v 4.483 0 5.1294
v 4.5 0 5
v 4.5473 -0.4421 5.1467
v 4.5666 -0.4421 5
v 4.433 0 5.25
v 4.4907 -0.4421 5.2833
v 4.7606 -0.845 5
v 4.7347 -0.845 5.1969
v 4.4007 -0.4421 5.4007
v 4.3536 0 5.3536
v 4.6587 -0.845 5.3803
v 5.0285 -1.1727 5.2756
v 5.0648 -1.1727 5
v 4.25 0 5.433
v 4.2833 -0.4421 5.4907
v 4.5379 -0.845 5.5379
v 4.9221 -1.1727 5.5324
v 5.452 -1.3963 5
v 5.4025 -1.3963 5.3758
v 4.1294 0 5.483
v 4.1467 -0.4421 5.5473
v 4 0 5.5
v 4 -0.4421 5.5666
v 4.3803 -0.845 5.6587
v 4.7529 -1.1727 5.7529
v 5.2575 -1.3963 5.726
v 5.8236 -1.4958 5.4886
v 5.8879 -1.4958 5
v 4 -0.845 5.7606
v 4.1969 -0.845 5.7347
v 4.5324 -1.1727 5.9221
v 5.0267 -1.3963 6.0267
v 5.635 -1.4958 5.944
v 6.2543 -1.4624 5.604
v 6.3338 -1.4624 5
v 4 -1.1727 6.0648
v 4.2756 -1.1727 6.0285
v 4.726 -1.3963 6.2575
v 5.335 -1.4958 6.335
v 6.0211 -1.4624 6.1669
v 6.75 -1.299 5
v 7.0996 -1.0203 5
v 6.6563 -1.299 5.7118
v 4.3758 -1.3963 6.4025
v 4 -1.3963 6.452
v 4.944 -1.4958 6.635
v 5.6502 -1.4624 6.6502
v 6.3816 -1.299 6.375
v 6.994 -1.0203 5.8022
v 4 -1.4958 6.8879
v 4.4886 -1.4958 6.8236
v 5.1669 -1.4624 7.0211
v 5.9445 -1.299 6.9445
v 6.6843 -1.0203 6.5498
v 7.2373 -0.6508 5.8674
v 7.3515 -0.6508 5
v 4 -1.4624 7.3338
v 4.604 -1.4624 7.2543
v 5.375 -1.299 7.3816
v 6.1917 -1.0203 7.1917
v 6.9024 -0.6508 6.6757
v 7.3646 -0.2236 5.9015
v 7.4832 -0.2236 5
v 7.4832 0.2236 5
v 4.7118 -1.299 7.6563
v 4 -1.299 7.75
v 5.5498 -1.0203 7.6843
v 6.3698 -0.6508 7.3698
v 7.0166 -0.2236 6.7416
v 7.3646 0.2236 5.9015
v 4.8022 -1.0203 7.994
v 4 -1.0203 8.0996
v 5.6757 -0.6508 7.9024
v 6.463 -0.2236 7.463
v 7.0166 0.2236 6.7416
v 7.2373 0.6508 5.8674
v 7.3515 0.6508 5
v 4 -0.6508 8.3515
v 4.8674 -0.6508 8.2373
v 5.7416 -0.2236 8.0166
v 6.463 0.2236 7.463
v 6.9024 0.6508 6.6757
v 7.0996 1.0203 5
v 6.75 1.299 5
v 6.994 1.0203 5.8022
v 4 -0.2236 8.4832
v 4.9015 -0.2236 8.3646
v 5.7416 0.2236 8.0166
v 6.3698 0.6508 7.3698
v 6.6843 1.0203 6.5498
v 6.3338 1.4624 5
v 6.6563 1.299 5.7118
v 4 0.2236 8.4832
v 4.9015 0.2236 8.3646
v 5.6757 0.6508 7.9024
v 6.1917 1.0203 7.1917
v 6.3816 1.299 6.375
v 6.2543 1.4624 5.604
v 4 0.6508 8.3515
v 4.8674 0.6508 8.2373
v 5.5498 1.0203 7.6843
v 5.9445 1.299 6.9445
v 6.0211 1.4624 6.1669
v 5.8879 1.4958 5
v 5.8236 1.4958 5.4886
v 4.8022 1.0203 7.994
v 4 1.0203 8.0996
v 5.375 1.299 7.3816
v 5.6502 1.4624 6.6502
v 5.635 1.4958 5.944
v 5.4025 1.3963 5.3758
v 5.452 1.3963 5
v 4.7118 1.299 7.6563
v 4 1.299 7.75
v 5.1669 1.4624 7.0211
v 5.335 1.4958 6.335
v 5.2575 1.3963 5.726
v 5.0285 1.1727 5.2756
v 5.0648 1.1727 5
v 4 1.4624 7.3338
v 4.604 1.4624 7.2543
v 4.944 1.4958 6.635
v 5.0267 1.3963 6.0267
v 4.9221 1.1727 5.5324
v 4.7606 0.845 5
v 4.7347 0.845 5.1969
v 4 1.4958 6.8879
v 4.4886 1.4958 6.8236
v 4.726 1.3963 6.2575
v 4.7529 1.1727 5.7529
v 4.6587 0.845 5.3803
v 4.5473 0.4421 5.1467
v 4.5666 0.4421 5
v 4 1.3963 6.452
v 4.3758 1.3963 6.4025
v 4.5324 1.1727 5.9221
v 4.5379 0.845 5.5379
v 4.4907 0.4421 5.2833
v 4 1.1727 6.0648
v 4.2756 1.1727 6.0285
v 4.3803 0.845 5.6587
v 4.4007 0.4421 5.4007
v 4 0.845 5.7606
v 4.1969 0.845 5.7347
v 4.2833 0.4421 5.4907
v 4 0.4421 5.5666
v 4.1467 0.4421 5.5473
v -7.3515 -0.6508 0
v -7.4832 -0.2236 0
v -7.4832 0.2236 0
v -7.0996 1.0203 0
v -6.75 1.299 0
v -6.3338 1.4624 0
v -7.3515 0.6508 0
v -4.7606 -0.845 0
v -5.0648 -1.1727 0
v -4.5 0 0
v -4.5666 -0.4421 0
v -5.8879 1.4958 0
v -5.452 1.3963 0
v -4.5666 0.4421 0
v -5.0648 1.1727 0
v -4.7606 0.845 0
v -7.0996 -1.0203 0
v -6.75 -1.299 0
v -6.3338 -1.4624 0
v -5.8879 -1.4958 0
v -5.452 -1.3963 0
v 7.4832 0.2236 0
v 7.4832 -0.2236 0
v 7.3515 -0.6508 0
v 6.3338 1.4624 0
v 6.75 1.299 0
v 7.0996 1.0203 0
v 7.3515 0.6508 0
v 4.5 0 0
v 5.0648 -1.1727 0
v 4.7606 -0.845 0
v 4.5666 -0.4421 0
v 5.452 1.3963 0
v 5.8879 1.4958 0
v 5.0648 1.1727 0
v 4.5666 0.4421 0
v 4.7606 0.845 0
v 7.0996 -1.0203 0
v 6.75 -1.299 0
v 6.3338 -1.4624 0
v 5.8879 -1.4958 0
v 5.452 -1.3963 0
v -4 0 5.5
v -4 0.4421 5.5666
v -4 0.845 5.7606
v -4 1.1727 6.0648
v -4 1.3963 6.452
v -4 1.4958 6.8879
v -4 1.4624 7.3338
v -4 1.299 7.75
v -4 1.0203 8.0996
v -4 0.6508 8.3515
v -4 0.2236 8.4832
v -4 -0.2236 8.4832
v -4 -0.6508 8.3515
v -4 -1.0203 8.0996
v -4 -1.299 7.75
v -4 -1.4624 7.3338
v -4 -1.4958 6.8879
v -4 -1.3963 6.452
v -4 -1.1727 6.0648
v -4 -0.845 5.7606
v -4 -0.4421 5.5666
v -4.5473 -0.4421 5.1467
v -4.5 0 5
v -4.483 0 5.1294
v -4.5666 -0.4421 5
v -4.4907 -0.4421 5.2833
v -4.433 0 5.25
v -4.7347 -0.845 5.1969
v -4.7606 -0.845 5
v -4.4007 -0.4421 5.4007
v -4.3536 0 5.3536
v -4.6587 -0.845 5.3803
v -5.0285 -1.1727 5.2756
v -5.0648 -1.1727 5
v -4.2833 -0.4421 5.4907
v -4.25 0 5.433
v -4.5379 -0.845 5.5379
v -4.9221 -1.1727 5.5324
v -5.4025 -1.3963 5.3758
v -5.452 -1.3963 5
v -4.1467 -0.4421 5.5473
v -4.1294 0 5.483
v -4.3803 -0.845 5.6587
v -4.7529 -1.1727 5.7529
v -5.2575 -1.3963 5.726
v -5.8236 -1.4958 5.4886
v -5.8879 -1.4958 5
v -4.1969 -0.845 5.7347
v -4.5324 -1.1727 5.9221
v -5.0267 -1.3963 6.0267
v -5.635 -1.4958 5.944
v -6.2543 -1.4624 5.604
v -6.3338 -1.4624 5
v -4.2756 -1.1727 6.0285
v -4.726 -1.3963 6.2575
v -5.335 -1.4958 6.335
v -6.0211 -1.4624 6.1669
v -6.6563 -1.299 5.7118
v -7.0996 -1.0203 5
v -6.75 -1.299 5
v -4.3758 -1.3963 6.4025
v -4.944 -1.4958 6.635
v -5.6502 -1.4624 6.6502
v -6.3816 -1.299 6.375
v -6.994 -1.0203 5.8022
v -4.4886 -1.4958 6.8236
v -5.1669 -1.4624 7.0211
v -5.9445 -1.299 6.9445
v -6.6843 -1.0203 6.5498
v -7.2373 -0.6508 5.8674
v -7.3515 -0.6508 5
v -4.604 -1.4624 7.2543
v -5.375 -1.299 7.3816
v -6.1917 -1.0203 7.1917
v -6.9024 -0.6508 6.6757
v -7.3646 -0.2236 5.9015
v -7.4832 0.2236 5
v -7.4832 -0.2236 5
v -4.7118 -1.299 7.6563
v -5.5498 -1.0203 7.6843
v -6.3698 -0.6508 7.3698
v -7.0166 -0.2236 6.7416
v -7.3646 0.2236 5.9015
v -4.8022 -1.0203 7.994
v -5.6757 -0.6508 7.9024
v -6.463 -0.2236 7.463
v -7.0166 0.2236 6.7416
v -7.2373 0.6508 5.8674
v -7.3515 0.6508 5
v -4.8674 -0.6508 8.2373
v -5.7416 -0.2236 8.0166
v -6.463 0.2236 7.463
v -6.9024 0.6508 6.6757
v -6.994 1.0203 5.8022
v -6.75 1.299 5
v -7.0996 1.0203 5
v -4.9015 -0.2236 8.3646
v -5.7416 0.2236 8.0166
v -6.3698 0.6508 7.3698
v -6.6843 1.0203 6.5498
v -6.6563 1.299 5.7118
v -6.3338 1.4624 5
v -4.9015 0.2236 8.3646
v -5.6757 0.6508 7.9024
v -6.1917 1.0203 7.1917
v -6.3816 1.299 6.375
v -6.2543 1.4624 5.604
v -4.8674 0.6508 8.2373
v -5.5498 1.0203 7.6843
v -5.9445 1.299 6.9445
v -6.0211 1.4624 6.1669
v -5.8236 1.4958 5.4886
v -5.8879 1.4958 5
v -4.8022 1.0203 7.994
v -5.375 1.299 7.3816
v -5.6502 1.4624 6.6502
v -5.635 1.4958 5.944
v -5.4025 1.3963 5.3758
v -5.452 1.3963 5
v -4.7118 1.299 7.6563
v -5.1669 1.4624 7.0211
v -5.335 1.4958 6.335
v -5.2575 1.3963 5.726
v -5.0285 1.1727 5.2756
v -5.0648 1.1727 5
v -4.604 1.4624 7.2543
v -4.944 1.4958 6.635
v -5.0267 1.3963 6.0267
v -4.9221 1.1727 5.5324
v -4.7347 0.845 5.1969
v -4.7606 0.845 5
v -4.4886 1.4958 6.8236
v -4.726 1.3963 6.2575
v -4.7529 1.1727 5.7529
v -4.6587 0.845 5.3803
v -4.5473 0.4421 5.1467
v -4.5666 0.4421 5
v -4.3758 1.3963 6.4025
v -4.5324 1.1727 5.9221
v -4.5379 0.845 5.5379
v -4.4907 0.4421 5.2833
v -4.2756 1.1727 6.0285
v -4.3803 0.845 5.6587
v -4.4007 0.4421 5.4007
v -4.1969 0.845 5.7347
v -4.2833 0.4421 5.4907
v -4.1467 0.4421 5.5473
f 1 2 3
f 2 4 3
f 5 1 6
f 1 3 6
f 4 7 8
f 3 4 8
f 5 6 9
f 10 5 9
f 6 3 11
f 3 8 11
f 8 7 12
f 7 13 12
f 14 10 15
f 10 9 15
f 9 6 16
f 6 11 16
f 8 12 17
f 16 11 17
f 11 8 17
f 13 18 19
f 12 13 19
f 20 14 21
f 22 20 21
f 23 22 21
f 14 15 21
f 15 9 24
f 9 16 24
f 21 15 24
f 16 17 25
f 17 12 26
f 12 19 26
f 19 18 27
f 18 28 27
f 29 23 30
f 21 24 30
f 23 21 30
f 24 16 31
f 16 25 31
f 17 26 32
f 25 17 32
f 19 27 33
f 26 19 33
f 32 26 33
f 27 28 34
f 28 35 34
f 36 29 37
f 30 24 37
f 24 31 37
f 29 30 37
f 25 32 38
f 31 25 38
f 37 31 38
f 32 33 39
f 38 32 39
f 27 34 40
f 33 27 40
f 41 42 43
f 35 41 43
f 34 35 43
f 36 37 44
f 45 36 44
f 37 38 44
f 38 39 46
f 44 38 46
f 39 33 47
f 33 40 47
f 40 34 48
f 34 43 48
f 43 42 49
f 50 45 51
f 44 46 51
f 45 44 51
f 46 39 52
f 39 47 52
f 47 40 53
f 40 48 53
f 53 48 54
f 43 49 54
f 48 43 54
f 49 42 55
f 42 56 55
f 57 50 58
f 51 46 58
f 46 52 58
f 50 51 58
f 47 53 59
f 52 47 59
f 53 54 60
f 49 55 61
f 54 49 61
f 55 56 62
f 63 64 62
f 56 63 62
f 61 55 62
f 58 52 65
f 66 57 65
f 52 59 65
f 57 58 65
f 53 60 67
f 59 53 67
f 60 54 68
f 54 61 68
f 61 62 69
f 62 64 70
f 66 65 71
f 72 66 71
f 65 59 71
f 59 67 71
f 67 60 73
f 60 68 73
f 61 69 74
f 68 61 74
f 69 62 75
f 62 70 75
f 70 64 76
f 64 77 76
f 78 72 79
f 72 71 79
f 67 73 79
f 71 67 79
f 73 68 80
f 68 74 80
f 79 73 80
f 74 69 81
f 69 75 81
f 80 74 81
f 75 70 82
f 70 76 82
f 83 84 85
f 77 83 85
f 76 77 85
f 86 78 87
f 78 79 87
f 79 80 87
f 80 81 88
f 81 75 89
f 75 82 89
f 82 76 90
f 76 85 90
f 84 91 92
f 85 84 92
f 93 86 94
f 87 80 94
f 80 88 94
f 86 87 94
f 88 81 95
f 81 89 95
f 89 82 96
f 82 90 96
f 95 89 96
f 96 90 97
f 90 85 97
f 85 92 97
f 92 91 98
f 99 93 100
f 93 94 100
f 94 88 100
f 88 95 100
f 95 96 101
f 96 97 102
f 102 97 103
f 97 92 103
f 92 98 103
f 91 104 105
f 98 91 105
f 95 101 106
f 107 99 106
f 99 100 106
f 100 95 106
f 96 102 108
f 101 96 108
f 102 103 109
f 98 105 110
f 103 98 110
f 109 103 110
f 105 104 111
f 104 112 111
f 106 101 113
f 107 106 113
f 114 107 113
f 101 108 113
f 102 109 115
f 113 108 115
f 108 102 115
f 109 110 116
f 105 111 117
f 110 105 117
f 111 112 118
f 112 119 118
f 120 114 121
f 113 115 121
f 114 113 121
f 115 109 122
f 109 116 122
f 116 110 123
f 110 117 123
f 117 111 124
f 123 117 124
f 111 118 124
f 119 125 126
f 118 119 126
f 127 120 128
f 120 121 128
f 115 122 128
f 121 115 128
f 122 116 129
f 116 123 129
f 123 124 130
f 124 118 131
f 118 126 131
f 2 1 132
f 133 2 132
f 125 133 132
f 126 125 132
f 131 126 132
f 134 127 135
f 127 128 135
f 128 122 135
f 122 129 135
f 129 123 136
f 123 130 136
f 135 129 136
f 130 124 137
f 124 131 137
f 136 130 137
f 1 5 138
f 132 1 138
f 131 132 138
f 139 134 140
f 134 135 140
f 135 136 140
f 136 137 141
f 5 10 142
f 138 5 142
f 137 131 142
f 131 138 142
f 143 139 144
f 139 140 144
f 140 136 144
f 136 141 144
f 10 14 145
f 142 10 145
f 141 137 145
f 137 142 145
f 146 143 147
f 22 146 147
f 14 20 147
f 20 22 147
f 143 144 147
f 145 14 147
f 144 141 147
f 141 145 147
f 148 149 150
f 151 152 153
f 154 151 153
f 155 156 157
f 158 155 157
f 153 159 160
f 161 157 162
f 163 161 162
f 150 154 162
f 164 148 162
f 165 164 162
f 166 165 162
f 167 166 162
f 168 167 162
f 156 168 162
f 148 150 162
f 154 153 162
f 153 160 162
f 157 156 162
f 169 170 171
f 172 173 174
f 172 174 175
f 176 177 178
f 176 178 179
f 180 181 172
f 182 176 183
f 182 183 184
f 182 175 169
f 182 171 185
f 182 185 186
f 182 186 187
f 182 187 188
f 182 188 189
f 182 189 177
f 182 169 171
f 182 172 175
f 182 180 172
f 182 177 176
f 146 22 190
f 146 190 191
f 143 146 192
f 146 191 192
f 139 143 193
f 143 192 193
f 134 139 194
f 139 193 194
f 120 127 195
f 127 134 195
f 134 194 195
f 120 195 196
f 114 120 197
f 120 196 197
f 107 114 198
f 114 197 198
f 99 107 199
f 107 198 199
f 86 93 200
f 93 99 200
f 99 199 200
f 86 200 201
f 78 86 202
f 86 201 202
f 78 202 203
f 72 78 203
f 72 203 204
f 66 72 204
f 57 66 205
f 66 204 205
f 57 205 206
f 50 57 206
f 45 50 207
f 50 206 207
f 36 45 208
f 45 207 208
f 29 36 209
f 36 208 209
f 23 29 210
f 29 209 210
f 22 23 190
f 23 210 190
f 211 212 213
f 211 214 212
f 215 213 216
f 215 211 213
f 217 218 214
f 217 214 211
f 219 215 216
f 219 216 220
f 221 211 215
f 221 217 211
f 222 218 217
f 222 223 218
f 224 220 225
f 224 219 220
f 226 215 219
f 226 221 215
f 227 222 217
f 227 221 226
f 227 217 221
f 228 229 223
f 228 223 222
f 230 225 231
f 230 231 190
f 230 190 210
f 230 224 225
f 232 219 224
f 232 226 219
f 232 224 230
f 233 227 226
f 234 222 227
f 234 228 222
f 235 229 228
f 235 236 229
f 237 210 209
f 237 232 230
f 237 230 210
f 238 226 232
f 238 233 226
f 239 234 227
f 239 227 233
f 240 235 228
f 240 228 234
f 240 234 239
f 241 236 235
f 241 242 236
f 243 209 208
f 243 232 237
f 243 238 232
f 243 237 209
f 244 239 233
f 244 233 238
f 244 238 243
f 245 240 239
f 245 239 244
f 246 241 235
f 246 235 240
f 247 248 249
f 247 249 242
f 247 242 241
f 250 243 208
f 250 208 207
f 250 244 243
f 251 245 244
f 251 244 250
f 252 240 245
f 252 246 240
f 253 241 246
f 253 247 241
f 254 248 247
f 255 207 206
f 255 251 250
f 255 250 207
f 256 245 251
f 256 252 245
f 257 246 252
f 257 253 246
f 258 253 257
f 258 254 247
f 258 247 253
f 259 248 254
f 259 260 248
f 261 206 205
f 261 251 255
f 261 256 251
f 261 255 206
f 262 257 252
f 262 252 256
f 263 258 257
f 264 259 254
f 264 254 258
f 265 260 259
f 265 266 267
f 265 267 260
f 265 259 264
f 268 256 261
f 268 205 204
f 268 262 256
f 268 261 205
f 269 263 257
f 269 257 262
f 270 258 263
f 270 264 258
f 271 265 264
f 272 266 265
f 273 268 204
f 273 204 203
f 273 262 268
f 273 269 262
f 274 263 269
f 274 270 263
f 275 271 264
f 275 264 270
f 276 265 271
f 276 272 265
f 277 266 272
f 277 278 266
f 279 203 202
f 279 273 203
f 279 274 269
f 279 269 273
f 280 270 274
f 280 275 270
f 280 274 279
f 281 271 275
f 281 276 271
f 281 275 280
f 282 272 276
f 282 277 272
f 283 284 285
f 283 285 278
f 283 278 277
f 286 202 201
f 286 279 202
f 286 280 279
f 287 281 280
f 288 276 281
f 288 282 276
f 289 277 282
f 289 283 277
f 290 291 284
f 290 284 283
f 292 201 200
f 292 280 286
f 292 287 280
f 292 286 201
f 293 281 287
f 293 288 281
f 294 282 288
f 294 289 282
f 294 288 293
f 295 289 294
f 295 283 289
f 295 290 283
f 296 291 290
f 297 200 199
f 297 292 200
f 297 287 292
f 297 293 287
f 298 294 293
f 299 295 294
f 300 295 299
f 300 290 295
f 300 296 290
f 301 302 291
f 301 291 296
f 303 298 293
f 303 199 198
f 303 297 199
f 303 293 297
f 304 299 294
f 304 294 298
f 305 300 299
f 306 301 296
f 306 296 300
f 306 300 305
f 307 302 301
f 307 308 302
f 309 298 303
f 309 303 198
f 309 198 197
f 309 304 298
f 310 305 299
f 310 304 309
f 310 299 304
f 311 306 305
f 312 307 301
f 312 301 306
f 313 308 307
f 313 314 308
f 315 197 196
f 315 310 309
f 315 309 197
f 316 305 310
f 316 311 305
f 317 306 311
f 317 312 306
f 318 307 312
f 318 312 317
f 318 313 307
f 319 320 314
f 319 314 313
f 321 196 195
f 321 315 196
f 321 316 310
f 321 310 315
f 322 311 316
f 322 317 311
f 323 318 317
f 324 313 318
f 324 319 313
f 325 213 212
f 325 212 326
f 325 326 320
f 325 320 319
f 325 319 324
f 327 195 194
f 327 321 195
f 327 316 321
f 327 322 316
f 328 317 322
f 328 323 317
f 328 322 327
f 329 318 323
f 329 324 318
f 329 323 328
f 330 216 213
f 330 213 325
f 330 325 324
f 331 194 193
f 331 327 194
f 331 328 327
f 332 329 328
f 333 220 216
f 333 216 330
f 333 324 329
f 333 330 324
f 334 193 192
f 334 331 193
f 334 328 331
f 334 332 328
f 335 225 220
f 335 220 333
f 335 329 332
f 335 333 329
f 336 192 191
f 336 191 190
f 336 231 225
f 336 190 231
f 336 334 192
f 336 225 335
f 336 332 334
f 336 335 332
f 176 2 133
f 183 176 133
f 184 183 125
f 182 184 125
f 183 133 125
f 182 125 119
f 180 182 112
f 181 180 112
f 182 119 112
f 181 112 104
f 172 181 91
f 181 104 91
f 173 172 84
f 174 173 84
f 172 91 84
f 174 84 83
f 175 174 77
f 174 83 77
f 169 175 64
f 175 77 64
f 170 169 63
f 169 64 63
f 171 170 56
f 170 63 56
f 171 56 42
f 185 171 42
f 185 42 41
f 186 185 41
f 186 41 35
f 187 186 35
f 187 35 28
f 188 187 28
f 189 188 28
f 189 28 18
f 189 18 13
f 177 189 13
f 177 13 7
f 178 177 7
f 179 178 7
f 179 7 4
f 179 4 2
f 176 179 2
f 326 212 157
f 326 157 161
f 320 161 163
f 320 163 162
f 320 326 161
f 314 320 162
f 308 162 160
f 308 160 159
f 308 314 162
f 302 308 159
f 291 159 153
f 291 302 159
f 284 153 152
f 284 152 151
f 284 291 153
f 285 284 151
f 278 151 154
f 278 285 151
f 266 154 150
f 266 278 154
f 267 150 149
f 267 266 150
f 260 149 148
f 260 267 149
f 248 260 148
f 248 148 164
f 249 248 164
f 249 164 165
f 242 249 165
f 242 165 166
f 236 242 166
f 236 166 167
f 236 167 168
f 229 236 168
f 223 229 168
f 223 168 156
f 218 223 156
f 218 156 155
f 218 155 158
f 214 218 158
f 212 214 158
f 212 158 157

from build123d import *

# Parameters (mm, degrees)
F0_R = 1.5


with BuildPart() as f2:
    # F2: sweep along a path in F1
    with BuildLine(Plane.XZ) as f2_path:
        Line((-6, 0), (-6, 5))
        ThreePointArc((-6, 5), (-5.4142135624, 6.4142135624), (-4, 7))
        Line((-4, 7), (0, 7))
    # F0 (on Top) → F2 (sweep)
    with BuildSketch(Plane.XY):
        with Locations((-6, 0)):
            Circle(F0_R)
    sweep(path=f2_path.line)

    # F3: F2 across plane


with BuildPart() as f2_1:
    add(f2.part)
    add(f2.part.mirror(Plane.YZ))


solid = f2_1.part
